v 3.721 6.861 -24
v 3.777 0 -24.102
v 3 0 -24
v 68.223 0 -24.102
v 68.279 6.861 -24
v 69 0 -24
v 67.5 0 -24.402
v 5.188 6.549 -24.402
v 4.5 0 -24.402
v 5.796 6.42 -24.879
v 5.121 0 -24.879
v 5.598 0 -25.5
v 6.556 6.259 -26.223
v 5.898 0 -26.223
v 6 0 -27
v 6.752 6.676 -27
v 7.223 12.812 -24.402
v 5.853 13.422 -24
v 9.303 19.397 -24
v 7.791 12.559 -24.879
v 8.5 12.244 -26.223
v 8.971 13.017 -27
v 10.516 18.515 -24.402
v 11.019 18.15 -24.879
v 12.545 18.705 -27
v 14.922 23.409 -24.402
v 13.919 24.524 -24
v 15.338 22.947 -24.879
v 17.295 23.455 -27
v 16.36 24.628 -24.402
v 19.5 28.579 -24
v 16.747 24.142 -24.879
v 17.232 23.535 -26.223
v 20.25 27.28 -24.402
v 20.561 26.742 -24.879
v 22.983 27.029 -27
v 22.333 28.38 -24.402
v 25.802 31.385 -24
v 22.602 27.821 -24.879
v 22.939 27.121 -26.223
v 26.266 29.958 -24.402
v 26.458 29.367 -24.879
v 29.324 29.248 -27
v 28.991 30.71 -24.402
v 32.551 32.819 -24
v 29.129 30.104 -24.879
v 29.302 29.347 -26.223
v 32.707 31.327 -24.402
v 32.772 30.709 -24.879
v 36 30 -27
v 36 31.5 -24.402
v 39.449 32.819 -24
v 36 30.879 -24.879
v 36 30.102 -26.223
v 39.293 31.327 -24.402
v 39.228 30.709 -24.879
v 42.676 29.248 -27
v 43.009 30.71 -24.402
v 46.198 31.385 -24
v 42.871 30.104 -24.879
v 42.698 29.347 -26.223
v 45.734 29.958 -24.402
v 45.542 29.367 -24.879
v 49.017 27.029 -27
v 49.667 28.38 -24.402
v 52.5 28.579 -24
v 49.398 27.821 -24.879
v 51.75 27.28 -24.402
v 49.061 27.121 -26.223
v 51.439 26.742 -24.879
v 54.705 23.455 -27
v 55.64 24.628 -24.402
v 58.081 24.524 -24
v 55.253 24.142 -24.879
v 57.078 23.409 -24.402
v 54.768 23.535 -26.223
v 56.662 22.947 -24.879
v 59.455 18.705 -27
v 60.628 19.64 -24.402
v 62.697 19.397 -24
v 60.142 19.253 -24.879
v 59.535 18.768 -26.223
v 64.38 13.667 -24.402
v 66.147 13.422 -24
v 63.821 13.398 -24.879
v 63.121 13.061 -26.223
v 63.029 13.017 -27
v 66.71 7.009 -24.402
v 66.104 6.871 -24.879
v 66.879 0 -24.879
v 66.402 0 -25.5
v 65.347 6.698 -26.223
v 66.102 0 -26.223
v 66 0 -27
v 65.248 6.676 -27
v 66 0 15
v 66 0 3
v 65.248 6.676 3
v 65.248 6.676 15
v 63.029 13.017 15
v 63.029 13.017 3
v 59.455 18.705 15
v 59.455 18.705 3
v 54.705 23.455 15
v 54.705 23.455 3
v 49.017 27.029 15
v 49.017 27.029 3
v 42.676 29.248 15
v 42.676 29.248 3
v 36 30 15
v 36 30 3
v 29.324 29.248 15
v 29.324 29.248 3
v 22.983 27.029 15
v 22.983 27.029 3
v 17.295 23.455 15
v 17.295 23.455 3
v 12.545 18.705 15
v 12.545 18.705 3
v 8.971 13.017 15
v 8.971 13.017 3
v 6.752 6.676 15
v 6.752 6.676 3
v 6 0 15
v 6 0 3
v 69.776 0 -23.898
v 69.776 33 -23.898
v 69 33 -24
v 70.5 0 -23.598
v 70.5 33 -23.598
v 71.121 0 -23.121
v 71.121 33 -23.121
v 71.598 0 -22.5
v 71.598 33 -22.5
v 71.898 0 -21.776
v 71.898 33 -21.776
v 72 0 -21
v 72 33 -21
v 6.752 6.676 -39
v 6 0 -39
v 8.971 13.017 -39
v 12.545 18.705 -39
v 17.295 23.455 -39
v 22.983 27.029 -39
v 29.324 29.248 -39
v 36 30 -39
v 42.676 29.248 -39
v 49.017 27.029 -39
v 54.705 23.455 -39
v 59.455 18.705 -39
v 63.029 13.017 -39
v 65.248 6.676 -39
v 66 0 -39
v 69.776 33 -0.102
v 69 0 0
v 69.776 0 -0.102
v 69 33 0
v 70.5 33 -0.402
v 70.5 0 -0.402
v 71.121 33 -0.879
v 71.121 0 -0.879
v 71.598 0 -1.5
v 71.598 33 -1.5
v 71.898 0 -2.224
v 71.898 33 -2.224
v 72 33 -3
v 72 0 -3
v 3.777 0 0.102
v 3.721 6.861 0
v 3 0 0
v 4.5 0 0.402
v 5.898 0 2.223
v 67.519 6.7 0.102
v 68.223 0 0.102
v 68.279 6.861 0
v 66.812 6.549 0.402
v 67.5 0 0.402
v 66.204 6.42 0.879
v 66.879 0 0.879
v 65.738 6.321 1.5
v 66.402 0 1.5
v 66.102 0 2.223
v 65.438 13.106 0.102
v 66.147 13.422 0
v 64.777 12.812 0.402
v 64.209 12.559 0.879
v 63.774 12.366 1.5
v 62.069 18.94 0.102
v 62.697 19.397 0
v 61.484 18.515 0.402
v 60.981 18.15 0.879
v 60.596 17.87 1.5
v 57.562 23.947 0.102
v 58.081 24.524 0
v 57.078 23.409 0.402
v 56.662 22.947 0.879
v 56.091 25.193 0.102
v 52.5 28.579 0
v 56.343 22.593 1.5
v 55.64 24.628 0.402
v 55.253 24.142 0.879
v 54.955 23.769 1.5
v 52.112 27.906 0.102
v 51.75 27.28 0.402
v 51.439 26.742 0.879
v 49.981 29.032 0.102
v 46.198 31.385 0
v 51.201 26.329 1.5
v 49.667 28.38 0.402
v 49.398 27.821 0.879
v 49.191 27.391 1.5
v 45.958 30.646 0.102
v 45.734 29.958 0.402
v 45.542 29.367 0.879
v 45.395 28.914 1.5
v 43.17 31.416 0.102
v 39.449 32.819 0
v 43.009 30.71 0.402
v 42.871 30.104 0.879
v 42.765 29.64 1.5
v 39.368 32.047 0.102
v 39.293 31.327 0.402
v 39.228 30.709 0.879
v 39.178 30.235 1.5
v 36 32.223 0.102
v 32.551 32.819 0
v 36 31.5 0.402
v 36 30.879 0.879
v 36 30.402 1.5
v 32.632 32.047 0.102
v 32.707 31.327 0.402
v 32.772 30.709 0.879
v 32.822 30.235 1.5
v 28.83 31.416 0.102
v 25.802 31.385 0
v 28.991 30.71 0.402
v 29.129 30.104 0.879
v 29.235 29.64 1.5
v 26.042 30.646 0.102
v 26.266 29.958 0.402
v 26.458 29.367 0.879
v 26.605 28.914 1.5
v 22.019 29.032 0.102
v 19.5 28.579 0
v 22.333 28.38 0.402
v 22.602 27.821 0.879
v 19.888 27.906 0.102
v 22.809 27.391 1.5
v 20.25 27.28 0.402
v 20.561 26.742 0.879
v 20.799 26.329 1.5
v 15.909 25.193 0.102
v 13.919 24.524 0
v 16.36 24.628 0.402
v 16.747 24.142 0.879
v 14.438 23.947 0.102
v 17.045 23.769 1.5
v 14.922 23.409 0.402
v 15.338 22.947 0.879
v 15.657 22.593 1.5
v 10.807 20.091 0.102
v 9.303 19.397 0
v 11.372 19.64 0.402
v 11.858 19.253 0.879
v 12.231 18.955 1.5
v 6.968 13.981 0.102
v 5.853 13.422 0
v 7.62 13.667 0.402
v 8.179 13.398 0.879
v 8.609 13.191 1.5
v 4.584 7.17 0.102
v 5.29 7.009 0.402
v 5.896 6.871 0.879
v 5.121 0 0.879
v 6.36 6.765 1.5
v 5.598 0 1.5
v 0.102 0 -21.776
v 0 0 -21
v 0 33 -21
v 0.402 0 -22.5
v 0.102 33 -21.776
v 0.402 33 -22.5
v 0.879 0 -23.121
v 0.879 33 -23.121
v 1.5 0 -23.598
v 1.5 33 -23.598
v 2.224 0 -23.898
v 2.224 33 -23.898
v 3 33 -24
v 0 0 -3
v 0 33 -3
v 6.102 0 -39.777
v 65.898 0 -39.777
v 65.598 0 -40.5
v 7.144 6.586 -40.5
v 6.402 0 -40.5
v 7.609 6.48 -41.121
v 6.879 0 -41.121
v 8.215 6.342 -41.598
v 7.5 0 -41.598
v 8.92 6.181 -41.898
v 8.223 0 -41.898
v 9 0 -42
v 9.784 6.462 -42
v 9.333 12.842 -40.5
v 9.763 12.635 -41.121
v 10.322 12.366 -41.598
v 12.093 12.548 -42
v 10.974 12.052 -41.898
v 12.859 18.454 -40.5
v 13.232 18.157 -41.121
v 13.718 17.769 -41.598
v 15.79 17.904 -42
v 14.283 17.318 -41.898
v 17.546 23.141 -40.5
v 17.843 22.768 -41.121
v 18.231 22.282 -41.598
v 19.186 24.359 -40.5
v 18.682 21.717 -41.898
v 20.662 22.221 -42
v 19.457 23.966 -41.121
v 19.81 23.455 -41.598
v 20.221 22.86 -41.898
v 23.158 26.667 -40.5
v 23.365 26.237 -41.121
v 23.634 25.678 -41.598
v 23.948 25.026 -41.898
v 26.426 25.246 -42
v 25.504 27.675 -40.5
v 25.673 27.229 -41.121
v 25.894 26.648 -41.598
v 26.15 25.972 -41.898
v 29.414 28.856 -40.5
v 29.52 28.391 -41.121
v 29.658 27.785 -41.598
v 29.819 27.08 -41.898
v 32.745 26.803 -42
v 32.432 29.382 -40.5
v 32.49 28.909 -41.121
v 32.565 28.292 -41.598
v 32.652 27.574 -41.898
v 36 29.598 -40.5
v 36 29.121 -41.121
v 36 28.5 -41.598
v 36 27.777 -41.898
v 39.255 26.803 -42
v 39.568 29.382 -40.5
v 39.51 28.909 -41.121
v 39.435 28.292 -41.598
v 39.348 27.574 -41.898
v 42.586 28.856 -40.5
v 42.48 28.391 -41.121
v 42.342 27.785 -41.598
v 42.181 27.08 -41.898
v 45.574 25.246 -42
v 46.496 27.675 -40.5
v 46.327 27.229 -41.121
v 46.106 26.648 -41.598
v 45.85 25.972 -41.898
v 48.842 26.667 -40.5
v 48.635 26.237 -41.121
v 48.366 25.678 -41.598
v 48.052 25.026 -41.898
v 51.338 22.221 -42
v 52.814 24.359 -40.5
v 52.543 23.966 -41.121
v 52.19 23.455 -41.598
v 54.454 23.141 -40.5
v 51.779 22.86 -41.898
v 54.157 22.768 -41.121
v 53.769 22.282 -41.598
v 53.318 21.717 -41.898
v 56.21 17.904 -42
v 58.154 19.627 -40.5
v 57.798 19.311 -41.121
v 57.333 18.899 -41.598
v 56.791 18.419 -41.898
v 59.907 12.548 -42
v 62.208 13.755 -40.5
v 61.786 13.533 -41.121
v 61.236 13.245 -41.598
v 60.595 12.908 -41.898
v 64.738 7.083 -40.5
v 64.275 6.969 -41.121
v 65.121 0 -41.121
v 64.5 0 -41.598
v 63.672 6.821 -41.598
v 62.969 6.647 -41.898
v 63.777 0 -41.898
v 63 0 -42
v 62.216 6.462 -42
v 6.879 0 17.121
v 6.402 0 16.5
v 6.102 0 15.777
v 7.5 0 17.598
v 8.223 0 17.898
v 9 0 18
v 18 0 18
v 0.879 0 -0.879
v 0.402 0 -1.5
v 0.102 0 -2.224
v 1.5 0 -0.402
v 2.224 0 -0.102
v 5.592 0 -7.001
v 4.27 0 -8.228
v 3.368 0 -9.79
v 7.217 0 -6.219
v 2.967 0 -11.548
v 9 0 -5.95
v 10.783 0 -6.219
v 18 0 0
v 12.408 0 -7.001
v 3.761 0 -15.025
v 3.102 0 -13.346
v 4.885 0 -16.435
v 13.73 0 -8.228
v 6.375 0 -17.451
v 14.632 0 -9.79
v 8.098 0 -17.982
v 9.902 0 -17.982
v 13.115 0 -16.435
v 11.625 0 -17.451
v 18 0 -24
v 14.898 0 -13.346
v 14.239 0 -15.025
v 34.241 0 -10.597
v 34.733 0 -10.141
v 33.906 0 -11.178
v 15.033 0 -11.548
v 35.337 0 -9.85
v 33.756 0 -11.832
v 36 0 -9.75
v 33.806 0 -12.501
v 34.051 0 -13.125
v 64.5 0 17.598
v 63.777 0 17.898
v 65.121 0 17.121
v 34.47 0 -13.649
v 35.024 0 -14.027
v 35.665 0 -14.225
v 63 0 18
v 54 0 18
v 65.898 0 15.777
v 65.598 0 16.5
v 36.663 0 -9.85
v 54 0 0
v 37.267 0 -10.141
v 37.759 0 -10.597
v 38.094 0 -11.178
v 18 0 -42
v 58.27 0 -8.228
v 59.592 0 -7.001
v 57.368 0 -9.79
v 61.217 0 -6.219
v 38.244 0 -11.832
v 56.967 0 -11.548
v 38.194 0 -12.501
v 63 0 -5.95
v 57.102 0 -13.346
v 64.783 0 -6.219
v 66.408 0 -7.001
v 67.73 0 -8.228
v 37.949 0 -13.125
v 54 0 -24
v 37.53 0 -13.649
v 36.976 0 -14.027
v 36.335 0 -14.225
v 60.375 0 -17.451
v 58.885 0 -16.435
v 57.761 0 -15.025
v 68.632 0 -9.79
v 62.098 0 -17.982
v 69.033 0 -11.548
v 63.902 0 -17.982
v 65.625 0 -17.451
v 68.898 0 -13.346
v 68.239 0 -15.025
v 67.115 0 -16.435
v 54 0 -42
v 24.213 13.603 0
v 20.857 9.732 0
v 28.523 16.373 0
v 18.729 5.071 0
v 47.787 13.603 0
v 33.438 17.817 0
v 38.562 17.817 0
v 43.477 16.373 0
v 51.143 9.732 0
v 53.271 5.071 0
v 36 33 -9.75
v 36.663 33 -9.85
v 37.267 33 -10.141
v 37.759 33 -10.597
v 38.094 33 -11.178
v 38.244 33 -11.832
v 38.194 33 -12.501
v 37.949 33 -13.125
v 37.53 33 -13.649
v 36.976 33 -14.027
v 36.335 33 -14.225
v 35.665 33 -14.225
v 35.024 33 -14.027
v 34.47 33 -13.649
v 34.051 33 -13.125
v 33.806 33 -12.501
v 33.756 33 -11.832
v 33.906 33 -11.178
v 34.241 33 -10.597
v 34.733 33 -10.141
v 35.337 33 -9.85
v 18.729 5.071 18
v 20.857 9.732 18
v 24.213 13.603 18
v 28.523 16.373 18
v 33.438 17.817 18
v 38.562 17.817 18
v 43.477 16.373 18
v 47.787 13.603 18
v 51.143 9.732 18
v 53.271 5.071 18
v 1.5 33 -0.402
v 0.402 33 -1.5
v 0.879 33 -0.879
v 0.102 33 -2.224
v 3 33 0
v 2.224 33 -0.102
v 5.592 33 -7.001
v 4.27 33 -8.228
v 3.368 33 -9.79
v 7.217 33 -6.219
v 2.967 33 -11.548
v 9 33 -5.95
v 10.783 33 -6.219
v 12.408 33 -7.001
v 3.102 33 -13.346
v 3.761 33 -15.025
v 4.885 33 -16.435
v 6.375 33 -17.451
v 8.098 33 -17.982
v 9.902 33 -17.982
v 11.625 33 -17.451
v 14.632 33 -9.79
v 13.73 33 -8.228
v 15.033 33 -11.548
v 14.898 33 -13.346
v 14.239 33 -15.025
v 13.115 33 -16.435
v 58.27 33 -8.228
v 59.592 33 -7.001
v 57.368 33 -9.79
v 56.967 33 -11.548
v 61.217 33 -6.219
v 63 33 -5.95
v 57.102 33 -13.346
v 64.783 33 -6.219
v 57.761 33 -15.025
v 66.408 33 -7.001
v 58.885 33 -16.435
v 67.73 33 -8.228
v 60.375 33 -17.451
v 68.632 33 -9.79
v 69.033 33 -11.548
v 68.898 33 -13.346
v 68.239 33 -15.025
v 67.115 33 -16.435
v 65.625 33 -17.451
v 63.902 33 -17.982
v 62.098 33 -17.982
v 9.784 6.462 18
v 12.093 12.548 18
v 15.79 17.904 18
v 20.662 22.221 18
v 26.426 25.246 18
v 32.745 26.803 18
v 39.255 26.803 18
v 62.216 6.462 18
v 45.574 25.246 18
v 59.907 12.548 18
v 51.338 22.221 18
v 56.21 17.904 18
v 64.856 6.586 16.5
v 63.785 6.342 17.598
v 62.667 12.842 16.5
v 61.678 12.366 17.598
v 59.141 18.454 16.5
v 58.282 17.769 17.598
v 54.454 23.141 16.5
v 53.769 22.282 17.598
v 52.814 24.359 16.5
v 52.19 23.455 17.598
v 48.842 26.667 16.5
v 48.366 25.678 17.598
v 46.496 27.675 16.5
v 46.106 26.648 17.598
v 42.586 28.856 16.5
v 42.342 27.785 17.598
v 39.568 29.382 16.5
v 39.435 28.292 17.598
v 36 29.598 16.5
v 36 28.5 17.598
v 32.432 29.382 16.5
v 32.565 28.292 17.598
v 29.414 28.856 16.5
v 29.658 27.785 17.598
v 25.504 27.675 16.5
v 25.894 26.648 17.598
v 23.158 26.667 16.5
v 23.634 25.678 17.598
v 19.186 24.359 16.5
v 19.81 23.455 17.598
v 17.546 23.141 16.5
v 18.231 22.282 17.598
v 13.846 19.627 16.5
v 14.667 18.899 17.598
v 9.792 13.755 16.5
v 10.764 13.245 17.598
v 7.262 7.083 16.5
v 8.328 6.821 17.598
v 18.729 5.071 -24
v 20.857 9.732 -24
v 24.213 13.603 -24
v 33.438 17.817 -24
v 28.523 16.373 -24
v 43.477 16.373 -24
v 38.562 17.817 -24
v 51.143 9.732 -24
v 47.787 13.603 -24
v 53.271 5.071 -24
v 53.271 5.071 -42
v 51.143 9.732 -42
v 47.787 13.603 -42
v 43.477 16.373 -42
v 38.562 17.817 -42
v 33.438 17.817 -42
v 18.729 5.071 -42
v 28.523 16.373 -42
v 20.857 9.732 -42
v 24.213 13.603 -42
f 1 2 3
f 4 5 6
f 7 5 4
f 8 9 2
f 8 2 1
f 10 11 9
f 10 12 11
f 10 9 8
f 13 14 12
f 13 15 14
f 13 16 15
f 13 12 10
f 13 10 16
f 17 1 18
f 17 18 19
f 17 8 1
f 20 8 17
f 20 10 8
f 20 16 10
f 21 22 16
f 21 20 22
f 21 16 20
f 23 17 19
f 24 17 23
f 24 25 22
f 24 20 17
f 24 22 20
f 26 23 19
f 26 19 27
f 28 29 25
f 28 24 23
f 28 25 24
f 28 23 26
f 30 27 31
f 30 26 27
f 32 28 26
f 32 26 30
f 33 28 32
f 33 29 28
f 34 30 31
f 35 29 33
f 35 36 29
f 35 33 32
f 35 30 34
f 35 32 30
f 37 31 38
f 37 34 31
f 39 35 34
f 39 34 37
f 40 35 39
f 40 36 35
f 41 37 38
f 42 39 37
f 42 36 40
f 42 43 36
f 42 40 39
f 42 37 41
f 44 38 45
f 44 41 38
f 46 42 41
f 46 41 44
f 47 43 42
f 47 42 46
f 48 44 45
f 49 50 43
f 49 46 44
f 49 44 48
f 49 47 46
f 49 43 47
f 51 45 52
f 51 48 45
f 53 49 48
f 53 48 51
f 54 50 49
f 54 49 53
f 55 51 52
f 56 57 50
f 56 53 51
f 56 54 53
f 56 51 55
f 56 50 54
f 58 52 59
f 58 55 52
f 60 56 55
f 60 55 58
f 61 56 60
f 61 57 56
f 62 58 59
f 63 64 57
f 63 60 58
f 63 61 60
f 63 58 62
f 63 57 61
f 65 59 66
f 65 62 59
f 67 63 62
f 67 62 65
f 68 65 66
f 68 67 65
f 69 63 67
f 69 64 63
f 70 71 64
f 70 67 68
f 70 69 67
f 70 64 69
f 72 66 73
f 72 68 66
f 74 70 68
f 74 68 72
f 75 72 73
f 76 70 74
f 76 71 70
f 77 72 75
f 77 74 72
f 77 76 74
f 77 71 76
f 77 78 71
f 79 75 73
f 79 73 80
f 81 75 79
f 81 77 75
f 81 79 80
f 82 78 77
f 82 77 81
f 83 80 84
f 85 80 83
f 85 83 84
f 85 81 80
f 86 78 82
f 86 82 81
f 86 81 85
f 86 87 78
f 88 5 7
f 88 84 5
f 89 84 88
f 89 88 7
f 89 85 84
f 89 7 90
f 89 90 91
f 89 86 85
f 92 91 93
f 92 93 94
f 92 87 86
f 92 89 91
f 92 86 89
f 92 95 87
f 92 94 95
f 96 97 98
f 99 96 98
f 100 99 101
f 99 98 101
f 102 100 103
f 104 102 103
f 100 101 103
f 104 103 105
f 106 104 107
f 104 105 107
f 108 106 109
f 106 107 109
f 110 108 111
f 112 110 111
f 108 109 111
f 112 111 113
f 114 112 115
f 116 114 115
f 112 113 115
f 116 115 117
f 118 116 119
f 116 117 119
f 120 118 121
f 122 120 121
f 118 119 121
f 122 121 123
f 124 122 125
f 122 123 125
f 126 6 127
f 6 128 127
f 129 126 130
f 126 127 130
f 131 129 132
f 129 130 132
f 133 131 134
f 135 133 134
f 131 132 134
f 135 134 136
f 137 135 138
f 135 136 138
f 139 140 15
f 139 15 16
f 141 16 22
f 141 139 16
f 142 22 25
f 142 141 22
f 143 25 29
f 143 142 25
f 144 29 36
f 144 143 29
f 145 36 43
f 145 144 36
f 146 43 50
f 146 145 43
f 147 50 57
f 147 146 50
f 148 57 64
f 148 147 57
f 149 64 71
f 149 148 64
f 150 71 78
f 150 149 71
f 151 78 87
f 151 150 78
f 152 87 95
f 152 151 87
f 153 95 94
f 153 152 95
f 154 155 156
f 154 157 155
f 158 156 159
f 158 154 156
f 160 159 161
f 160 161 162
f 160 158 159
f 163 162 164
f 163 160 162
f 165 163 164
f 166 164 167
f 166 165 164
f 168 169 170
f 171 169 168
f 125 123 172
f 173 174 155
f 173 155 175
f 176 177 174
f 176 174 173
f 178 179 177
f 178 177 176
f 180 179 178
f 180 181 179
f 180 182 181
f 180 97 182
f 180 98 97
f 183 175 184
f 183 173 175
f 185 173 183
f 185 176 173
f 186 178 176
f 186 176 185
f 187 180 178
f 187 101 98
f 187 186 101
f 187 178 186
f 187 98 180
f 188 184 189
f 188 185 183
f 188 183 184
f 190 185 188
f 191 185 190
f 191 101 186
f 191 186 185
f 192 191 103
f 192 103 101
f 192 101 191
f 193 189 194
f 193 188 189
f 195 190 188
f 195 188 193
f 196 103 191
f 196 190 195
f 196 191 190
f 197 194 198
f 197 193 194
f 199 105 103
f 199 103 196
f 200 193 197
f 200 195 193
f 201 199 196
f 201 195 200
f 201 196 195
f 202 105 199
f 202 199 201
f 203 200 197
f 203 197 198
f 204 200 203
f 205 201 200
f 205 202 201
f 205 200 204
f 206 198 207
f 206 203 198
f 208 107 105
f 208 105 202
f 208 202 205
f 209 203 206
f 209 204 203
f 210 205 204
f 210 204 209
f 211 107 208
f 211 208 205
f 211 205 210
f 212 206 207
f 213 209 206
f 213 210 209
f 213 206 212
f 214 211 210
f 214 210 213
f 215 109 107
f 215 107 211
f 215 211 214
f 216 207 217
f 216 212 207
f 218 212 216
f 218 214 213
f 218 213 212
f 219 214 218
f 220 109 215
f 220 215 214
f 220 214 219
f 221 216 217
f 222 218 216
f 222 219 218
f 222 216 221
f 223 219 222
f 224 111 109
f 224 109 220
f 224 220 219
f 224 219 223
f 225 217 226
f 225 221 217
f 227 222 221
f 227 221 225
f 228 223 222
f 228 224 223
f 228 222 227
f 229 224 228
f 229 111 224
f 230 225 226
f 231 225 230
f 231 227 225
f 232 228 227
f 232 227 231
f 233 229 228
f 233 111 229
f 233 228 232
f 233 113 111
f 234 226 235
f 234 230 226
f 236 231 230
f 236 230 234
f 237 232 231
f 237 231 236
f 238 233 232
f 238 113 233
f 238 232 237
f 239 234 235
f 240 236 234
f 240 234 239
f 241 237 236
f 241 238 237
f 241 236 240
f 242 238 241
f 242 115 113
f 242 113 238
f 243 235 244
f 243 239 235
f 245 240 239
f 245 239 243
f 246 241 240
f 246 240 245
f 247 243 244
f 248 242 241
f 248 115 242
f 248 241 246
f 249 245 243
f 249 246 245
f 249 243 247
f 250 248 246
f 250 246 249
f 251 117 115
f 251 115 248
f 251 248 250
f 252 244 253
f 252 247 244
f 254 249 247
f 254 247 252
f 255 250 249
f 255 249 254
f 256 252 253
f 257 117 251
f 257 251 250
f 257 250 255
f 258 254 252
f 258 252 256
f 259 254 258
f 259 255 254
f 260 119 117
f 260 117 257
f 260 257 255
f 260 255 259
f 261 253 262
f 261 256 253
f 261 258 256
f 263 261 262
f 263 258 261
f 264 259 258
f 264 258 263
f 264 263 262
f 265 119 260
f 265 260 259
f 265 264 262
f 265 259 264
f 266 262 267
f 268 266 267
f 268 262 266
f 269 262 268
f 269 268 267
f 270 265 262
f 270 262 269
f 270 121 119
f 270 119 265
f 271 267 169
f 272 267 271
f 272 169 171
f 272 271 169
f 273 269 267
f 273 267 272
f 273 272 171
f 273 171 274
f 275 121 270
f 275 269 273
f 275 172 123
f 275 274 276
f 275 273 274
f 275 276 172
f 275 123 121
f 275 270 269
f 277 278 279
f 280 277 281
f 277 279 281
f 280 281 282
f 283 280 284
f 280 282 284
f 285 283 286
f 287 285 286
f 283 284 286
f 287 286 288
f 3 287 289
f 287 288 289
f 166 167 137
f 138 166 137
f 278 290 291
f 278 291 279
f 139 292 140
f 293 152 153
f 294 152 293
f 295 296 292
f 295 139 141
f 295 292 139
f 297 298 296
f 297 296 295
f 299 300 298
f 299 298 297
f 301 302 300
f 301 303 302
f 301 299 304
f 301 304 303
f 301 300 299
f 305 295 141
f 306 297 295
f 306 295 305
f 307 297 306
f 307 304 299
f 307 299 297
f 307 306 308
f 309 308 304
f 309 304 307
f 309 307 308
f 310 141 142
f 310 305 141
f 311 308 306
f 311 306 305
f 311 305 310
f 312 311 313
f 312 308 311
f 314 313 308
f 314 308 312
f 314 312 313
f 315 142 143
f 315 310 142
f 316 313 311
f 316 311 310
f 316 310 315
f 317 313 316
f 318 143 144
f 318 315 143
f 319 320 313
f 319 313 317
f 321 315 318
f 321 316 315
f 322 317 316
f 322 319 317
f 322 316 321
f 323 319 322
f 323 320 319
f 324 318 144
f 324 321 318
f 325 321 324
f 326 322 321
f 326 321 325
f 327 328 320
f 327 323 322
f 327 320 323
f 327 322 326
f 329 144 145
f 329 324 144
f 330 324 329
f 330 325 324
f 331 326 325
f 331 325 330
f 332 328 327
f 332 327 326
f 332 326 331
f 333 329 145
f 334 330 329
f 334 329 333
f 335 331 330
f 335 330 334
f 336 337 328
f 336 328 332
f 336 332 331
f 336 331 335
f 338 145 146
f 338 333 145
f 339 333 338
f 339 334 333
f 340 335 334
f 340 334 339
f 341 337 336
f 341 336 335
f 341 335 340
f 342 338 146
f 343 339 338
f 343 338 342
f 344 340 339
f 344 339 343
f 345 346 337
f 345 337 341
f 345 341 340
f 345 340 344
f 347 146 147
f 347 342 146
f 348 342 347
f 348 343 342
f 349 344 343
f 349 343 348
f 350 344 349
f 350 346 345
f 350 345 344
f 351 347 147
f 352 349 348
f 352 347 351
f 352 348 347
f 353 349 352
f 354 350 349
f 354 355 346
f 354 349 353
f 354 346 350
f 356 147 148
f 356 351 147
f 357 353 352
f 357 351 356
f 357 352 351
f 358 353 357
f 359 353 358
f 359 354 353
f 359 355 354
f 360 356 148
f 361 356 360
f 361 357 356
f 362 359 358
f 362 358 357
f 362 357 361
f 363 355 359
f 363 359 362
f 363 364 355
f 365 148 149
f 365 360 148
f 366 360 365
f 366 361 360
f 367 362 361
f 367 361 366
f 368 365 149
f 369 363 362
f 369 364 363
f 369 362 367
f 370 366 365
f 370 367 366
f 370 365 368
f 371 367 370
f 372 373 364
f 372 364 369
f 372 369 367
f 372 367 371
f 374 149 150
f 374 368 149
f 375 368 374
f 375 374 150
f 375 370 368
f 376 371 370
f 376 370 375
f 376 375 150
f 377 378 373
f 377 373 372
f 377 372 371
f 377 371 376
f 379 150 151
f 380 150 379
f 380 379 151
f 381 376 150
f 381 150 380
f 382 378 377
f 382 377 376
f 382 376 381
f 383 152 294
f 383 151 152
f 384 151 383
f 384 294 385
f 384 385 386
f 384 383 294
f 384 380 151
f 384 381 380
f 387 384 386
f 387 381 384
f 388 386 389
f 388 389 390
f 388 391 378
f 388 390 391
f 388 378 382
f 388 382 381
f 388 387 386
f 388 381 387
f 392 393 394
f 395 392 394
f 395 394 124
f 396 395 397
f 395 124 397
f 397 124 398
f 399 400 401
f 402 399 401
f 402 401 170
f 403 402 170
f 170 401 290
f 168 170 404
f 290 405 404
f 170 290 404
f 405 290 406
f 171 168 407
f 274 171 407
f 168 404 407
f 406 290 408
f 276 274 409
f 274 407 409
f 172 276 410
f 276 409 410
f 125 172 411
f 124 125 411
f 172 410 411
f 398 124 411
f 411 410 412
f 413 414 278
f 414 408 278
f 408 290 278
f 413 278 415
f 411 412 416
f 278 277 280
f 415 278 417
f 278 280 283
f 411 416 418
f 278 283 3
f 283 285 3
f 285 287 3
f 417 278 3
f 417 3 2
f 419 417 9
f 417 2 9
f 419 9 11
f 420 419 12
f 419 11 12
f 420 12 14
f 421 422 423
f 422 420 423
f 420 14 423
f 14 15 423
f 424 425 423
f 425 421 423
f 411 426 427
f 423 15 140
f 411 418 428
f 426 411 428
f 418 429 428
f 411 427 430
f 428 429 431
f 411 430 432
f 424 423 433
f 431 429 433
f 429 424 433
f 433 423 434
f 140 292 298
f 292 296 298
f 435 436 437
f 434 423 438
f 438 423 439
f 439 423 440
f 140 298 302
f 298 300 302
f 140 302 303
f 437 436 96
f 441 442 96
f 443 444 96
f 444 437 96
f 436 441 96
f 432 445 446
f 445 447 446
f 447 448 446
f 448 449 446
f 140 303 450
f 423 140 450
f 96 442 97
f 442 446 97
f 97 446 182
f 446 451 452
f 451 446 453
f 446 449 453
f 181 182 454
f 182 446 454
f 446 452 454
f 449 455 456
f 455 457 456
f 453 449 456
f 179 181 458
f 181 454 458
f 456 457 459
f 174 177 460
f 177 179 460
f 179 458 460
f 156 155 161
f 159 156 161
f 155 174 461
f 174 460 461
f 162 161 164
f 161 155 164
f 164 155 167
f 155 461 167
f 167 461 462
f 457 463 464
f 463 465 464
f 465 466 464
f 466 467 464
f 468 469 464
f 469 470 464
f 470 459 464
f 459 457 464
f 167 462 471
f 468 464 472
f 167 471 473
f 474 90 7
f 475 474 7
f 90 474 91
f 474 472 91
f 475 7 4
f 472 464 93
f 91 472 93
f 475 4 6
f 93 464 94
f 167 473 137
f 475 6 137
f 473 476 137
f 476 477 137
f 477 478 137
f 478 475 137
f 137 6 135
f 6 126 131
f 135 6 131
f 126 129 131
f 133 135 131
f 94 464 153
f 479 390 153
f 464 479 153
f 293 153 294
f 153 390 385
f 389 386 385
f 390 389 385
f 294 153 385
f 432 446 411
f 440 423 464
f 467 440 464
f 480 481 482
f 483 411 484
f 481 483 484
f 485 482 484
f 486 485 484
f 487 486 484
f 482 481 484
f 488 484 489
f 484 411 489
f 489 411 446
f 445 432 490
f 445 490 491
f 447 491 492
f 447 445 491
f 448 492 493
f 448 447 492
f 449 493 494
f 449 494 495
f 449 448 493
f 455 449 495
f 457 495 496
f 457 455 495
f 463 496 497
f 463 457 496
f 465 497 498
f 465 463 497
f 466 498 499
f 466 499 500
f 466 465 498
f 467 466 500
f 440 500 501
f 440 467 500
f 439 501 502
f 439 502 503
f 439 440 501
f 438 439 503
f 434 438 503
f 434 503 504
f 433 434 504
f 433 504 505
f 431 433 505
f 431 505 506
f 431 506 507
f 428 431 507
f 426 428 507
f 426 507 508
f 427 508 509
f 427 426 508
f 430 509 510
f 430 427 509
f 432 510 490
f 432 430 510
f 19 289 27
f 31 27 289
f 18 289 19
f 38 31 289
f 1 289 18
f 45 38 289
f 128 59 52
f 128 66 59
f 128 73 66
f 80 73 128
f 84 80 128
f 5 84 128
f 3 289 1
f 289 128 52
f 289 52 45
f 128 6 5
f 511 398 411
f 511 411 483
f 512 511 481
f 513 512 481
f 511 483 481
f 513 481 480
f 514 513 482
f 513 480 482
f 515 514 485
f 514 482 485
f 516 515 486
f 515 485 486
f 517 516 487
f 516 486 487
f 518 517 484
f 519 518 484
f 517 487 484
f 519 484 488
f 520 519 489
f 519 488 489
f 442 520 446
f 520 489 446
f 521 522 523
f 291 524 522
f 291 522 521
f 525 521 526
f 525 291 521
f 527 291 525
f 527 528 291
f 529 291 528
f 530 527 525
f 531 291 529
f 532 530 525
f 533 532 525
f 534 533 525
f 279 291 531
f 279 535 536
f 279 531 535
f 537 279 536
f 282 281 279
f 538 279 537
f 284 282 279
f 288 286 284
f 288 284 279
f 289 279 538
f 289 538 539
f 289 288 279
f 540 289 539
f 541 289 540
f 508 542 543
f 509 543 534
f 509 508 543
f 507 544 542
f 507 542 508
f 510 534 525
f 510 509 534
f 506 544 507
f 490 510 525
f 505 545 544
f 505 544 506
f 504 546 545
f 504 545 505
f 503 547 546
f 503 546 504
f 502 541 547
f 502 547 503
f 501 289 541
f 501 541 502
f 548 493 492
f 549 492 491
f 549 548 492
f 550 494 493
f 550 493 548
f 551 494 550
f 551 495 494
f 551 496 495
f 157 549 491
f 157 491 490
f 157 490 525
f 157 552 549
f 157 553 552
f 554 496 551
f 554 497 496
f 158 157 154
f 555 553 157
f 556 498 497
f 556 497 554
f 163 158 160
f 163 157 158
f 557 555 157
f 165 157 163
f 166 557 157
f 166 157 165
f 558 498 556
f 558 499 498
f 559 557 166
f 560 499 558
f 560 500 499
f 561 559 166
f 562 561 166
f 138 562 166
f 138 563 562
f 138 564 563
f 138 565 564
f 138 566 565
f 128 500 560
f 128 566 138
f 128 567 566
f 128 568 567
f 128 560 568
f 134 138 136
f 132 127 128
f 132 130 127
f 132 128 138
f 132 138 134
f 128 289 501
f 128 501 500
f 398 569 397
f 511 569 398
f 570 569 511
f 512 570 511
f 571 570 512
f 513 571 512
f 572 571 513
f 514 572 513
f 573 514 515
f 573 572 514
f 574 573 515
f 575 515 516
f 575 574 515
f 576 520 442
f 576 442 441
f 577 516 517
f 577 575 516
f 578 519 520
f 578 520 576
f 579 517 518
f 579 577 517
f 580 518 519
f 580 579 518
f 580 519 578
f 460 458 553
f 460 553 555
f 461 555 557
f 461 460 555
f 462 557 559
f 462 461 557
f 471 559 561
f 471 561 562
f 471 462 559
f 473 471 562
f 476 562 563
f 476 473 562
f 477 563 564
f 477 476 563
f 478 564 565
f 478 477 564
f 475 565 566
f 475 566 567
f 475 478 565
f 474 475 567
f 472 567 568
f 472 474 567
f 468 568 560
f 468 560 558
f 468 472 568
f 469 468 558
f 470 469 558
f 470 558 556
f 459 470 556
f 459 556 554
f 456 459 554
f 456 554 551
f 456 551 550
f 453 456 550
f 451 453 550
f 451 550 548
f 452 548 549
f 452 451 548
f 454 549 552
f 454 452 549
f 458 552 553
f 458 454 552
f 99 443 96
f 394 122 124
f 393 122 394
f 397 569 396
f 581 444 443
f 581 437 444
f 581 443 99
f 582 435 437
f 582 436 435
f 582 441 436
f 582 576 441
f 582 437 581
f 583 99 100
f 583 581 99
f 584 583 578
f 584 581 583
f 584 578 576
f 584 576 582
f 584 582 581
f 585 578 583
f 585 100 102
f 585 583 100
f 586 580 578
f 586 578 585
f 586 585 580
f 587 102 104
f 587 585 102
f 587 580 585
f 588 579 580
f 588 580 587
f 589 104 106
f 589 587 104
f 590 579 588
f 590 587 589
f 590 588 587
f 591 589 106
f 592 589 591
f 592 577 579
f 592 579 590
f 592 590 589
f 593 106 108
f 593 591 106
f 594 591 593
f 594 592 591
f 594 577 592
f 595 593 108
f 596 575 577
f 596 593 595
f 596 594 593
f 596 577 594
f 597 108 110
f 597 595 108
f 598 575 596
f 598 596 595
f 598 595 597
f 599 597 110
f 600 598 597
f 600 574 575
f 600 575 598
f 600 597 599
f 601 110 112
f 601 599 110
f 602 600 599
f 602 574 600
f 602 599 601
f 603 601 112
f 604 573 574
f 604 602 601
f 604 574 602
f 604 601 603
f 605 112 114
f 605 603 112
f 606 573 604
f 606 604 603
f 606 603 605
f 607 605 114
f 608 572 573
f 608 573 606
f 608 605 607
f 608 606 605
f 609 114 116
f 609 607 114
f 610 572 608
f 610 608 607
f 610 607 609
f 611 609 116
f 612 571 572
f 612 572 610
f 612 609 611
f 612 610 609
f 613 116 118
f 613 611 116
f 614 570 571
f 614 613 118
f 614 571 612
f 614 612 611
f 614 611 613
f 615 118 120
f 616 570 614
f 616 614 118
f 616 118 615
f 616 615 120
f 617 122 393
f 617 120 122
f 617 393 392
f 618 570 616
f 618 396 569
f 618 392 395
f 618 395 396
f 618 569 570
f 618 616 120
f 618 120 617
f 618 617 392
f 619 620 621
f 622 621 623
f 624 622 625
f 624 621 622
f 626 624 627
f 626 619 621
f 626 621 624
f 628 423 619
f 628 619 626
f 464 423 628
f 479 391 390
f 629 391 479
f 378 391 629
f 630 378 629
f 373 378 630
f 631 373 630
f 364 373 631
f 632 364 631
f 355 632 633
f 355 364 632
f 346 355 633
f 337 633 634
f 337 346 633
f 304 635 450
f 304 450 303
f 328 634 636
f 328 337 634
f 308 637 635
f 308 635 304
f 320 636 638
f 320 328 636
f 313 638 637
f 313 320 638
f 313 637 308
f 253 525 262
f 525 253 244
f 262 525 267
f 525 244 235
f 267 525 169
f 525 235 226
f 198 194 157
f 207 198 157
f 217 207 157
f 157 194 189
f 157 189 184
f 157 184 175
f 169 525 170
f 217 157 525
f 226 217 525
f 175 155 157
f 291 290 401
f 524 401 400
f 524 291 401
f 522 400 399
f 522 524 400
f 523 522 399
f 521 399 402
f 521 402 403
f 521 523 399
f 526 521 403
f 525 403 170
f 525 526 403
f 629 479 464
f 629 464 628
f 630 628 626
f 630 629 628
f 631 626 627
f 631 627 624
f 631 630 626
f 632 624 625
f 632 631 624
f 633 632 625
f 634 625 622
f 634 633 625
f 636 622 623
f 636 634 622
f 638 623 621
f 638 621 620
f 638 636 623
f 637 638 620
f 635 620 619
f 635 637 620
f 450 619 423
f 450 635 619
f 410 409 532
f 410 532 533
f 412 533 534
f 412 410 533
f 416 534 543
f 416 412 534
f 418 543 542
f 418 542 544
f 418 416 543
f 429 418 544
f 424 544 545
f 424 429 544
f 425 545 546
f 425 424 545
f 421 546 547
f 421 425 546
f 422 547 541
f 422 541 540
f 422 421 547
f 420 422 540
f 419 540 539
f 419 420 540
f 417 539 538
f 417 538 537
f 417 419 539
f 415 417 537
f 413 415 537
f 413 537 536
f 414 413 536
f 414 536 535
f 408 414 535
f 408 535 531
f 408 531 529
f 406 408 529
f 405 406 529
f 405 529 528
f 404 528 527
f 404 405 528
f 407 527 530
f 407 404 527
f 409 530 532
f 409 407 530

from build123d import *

# Parameters (mm, degrees)
SKETCH_2_W      = 72
SKETCH_2_H      = 24
SKETCH_2_R      = 6.05
SKETCH_2_R_2    = 2.25
EXTRUDE_1_DEPTH = 33
FILLET_1_R      = 3
EXTRUDE_2_DEPTH = 18
EXTRUDE_START   = 18
EXTRUDE_3_DEPTH = 18
FILLET_2_R      = 3


with BuildPart() as part:
    # 草圖2 → 填料-伸長1 (new body)
    with BuildSketch(Plane(origin=(0, 0, 0), x_dir=(1, 0, 0), z_dir=(0, 1, 0))):
        with Locations((36, 12)):
            Rectangle(SKETCH_2_W, SKETCH_2_H)
        with Locations(Location((9, 12, 0), (0, 0, 270))):
            Circle(SKETCH_2_R, mode=Mode.SUBTRACT)
        with Locations(Location((63, 12, 0), (0, 0, 270))):
            Circle(SKETCH_2_R, mode=Mode.SUBTRACT)
        with Locations(Location((36, 12, 0), (0, 0, 270))):
            Circle(SKETCH_2_R_2, mode=Mode.SUBTRACT)
    extrude(amount=EXTRUDE_1_DEPTH)

    # 圓角1
    fillet_1_edges = [part.edges().sort_by_distance(p)[0] for p in [
        (0, 16.5, -24),
        (72, 16.5, -24),
        (72, 16.5, 0),
        (0, 16.5, 0),
    ]]
    fillet(fillet_1_edges, radius=FILLET_1_R)

    # 草圖4 → 填料-伸長2 (add)
    with BuildSketch(Plane.XY):
        with BuildLine():
            ThreePointArc((66, 0), (36, 30), (6, 0))
            Line((6, 0), (18, 0))
            ThreePointArc((18, 0), (36, 18), (54, 0))
            Line((54, 0), (66, 0))
        make_face()
    extrude(amount=EXTRUDE_2_DEPTH)

    # 草圖5 → 填料-伸長3 (add)
    with BuildSketch(Plane(origin=(0, 0, -24), x_dir=(-1, 0, 0), z_dir=(0, 0, -1)).offset(EXTRUDE_START)):
        with BuildLine():
            ThreePointArc((-6, 0), (-36, 30), (-66, 0))
            Line((-66, 0), (-54, 0))
            ThreePointArc((-54, 0), (-36, 18), (-18, 0))
            Line((-18, 0), (-6, 0))
        make_face()
    extrude(amount=-EXTRUDE_3_DEPTH)

    # 圓角2
    fillet_2_edges = [part.edges().sort_by_distance(p)[0] for p in [
        (36, 30, -42),
        (36, 30, -24),
        (36, 30, 18),
        (36, 30, 0),
    ]]
    fillet(fillet_2_edges, radius=FILLET_2_R - 0.0001)  # a hair under: the kernel refuses the full size


solid = part.part
